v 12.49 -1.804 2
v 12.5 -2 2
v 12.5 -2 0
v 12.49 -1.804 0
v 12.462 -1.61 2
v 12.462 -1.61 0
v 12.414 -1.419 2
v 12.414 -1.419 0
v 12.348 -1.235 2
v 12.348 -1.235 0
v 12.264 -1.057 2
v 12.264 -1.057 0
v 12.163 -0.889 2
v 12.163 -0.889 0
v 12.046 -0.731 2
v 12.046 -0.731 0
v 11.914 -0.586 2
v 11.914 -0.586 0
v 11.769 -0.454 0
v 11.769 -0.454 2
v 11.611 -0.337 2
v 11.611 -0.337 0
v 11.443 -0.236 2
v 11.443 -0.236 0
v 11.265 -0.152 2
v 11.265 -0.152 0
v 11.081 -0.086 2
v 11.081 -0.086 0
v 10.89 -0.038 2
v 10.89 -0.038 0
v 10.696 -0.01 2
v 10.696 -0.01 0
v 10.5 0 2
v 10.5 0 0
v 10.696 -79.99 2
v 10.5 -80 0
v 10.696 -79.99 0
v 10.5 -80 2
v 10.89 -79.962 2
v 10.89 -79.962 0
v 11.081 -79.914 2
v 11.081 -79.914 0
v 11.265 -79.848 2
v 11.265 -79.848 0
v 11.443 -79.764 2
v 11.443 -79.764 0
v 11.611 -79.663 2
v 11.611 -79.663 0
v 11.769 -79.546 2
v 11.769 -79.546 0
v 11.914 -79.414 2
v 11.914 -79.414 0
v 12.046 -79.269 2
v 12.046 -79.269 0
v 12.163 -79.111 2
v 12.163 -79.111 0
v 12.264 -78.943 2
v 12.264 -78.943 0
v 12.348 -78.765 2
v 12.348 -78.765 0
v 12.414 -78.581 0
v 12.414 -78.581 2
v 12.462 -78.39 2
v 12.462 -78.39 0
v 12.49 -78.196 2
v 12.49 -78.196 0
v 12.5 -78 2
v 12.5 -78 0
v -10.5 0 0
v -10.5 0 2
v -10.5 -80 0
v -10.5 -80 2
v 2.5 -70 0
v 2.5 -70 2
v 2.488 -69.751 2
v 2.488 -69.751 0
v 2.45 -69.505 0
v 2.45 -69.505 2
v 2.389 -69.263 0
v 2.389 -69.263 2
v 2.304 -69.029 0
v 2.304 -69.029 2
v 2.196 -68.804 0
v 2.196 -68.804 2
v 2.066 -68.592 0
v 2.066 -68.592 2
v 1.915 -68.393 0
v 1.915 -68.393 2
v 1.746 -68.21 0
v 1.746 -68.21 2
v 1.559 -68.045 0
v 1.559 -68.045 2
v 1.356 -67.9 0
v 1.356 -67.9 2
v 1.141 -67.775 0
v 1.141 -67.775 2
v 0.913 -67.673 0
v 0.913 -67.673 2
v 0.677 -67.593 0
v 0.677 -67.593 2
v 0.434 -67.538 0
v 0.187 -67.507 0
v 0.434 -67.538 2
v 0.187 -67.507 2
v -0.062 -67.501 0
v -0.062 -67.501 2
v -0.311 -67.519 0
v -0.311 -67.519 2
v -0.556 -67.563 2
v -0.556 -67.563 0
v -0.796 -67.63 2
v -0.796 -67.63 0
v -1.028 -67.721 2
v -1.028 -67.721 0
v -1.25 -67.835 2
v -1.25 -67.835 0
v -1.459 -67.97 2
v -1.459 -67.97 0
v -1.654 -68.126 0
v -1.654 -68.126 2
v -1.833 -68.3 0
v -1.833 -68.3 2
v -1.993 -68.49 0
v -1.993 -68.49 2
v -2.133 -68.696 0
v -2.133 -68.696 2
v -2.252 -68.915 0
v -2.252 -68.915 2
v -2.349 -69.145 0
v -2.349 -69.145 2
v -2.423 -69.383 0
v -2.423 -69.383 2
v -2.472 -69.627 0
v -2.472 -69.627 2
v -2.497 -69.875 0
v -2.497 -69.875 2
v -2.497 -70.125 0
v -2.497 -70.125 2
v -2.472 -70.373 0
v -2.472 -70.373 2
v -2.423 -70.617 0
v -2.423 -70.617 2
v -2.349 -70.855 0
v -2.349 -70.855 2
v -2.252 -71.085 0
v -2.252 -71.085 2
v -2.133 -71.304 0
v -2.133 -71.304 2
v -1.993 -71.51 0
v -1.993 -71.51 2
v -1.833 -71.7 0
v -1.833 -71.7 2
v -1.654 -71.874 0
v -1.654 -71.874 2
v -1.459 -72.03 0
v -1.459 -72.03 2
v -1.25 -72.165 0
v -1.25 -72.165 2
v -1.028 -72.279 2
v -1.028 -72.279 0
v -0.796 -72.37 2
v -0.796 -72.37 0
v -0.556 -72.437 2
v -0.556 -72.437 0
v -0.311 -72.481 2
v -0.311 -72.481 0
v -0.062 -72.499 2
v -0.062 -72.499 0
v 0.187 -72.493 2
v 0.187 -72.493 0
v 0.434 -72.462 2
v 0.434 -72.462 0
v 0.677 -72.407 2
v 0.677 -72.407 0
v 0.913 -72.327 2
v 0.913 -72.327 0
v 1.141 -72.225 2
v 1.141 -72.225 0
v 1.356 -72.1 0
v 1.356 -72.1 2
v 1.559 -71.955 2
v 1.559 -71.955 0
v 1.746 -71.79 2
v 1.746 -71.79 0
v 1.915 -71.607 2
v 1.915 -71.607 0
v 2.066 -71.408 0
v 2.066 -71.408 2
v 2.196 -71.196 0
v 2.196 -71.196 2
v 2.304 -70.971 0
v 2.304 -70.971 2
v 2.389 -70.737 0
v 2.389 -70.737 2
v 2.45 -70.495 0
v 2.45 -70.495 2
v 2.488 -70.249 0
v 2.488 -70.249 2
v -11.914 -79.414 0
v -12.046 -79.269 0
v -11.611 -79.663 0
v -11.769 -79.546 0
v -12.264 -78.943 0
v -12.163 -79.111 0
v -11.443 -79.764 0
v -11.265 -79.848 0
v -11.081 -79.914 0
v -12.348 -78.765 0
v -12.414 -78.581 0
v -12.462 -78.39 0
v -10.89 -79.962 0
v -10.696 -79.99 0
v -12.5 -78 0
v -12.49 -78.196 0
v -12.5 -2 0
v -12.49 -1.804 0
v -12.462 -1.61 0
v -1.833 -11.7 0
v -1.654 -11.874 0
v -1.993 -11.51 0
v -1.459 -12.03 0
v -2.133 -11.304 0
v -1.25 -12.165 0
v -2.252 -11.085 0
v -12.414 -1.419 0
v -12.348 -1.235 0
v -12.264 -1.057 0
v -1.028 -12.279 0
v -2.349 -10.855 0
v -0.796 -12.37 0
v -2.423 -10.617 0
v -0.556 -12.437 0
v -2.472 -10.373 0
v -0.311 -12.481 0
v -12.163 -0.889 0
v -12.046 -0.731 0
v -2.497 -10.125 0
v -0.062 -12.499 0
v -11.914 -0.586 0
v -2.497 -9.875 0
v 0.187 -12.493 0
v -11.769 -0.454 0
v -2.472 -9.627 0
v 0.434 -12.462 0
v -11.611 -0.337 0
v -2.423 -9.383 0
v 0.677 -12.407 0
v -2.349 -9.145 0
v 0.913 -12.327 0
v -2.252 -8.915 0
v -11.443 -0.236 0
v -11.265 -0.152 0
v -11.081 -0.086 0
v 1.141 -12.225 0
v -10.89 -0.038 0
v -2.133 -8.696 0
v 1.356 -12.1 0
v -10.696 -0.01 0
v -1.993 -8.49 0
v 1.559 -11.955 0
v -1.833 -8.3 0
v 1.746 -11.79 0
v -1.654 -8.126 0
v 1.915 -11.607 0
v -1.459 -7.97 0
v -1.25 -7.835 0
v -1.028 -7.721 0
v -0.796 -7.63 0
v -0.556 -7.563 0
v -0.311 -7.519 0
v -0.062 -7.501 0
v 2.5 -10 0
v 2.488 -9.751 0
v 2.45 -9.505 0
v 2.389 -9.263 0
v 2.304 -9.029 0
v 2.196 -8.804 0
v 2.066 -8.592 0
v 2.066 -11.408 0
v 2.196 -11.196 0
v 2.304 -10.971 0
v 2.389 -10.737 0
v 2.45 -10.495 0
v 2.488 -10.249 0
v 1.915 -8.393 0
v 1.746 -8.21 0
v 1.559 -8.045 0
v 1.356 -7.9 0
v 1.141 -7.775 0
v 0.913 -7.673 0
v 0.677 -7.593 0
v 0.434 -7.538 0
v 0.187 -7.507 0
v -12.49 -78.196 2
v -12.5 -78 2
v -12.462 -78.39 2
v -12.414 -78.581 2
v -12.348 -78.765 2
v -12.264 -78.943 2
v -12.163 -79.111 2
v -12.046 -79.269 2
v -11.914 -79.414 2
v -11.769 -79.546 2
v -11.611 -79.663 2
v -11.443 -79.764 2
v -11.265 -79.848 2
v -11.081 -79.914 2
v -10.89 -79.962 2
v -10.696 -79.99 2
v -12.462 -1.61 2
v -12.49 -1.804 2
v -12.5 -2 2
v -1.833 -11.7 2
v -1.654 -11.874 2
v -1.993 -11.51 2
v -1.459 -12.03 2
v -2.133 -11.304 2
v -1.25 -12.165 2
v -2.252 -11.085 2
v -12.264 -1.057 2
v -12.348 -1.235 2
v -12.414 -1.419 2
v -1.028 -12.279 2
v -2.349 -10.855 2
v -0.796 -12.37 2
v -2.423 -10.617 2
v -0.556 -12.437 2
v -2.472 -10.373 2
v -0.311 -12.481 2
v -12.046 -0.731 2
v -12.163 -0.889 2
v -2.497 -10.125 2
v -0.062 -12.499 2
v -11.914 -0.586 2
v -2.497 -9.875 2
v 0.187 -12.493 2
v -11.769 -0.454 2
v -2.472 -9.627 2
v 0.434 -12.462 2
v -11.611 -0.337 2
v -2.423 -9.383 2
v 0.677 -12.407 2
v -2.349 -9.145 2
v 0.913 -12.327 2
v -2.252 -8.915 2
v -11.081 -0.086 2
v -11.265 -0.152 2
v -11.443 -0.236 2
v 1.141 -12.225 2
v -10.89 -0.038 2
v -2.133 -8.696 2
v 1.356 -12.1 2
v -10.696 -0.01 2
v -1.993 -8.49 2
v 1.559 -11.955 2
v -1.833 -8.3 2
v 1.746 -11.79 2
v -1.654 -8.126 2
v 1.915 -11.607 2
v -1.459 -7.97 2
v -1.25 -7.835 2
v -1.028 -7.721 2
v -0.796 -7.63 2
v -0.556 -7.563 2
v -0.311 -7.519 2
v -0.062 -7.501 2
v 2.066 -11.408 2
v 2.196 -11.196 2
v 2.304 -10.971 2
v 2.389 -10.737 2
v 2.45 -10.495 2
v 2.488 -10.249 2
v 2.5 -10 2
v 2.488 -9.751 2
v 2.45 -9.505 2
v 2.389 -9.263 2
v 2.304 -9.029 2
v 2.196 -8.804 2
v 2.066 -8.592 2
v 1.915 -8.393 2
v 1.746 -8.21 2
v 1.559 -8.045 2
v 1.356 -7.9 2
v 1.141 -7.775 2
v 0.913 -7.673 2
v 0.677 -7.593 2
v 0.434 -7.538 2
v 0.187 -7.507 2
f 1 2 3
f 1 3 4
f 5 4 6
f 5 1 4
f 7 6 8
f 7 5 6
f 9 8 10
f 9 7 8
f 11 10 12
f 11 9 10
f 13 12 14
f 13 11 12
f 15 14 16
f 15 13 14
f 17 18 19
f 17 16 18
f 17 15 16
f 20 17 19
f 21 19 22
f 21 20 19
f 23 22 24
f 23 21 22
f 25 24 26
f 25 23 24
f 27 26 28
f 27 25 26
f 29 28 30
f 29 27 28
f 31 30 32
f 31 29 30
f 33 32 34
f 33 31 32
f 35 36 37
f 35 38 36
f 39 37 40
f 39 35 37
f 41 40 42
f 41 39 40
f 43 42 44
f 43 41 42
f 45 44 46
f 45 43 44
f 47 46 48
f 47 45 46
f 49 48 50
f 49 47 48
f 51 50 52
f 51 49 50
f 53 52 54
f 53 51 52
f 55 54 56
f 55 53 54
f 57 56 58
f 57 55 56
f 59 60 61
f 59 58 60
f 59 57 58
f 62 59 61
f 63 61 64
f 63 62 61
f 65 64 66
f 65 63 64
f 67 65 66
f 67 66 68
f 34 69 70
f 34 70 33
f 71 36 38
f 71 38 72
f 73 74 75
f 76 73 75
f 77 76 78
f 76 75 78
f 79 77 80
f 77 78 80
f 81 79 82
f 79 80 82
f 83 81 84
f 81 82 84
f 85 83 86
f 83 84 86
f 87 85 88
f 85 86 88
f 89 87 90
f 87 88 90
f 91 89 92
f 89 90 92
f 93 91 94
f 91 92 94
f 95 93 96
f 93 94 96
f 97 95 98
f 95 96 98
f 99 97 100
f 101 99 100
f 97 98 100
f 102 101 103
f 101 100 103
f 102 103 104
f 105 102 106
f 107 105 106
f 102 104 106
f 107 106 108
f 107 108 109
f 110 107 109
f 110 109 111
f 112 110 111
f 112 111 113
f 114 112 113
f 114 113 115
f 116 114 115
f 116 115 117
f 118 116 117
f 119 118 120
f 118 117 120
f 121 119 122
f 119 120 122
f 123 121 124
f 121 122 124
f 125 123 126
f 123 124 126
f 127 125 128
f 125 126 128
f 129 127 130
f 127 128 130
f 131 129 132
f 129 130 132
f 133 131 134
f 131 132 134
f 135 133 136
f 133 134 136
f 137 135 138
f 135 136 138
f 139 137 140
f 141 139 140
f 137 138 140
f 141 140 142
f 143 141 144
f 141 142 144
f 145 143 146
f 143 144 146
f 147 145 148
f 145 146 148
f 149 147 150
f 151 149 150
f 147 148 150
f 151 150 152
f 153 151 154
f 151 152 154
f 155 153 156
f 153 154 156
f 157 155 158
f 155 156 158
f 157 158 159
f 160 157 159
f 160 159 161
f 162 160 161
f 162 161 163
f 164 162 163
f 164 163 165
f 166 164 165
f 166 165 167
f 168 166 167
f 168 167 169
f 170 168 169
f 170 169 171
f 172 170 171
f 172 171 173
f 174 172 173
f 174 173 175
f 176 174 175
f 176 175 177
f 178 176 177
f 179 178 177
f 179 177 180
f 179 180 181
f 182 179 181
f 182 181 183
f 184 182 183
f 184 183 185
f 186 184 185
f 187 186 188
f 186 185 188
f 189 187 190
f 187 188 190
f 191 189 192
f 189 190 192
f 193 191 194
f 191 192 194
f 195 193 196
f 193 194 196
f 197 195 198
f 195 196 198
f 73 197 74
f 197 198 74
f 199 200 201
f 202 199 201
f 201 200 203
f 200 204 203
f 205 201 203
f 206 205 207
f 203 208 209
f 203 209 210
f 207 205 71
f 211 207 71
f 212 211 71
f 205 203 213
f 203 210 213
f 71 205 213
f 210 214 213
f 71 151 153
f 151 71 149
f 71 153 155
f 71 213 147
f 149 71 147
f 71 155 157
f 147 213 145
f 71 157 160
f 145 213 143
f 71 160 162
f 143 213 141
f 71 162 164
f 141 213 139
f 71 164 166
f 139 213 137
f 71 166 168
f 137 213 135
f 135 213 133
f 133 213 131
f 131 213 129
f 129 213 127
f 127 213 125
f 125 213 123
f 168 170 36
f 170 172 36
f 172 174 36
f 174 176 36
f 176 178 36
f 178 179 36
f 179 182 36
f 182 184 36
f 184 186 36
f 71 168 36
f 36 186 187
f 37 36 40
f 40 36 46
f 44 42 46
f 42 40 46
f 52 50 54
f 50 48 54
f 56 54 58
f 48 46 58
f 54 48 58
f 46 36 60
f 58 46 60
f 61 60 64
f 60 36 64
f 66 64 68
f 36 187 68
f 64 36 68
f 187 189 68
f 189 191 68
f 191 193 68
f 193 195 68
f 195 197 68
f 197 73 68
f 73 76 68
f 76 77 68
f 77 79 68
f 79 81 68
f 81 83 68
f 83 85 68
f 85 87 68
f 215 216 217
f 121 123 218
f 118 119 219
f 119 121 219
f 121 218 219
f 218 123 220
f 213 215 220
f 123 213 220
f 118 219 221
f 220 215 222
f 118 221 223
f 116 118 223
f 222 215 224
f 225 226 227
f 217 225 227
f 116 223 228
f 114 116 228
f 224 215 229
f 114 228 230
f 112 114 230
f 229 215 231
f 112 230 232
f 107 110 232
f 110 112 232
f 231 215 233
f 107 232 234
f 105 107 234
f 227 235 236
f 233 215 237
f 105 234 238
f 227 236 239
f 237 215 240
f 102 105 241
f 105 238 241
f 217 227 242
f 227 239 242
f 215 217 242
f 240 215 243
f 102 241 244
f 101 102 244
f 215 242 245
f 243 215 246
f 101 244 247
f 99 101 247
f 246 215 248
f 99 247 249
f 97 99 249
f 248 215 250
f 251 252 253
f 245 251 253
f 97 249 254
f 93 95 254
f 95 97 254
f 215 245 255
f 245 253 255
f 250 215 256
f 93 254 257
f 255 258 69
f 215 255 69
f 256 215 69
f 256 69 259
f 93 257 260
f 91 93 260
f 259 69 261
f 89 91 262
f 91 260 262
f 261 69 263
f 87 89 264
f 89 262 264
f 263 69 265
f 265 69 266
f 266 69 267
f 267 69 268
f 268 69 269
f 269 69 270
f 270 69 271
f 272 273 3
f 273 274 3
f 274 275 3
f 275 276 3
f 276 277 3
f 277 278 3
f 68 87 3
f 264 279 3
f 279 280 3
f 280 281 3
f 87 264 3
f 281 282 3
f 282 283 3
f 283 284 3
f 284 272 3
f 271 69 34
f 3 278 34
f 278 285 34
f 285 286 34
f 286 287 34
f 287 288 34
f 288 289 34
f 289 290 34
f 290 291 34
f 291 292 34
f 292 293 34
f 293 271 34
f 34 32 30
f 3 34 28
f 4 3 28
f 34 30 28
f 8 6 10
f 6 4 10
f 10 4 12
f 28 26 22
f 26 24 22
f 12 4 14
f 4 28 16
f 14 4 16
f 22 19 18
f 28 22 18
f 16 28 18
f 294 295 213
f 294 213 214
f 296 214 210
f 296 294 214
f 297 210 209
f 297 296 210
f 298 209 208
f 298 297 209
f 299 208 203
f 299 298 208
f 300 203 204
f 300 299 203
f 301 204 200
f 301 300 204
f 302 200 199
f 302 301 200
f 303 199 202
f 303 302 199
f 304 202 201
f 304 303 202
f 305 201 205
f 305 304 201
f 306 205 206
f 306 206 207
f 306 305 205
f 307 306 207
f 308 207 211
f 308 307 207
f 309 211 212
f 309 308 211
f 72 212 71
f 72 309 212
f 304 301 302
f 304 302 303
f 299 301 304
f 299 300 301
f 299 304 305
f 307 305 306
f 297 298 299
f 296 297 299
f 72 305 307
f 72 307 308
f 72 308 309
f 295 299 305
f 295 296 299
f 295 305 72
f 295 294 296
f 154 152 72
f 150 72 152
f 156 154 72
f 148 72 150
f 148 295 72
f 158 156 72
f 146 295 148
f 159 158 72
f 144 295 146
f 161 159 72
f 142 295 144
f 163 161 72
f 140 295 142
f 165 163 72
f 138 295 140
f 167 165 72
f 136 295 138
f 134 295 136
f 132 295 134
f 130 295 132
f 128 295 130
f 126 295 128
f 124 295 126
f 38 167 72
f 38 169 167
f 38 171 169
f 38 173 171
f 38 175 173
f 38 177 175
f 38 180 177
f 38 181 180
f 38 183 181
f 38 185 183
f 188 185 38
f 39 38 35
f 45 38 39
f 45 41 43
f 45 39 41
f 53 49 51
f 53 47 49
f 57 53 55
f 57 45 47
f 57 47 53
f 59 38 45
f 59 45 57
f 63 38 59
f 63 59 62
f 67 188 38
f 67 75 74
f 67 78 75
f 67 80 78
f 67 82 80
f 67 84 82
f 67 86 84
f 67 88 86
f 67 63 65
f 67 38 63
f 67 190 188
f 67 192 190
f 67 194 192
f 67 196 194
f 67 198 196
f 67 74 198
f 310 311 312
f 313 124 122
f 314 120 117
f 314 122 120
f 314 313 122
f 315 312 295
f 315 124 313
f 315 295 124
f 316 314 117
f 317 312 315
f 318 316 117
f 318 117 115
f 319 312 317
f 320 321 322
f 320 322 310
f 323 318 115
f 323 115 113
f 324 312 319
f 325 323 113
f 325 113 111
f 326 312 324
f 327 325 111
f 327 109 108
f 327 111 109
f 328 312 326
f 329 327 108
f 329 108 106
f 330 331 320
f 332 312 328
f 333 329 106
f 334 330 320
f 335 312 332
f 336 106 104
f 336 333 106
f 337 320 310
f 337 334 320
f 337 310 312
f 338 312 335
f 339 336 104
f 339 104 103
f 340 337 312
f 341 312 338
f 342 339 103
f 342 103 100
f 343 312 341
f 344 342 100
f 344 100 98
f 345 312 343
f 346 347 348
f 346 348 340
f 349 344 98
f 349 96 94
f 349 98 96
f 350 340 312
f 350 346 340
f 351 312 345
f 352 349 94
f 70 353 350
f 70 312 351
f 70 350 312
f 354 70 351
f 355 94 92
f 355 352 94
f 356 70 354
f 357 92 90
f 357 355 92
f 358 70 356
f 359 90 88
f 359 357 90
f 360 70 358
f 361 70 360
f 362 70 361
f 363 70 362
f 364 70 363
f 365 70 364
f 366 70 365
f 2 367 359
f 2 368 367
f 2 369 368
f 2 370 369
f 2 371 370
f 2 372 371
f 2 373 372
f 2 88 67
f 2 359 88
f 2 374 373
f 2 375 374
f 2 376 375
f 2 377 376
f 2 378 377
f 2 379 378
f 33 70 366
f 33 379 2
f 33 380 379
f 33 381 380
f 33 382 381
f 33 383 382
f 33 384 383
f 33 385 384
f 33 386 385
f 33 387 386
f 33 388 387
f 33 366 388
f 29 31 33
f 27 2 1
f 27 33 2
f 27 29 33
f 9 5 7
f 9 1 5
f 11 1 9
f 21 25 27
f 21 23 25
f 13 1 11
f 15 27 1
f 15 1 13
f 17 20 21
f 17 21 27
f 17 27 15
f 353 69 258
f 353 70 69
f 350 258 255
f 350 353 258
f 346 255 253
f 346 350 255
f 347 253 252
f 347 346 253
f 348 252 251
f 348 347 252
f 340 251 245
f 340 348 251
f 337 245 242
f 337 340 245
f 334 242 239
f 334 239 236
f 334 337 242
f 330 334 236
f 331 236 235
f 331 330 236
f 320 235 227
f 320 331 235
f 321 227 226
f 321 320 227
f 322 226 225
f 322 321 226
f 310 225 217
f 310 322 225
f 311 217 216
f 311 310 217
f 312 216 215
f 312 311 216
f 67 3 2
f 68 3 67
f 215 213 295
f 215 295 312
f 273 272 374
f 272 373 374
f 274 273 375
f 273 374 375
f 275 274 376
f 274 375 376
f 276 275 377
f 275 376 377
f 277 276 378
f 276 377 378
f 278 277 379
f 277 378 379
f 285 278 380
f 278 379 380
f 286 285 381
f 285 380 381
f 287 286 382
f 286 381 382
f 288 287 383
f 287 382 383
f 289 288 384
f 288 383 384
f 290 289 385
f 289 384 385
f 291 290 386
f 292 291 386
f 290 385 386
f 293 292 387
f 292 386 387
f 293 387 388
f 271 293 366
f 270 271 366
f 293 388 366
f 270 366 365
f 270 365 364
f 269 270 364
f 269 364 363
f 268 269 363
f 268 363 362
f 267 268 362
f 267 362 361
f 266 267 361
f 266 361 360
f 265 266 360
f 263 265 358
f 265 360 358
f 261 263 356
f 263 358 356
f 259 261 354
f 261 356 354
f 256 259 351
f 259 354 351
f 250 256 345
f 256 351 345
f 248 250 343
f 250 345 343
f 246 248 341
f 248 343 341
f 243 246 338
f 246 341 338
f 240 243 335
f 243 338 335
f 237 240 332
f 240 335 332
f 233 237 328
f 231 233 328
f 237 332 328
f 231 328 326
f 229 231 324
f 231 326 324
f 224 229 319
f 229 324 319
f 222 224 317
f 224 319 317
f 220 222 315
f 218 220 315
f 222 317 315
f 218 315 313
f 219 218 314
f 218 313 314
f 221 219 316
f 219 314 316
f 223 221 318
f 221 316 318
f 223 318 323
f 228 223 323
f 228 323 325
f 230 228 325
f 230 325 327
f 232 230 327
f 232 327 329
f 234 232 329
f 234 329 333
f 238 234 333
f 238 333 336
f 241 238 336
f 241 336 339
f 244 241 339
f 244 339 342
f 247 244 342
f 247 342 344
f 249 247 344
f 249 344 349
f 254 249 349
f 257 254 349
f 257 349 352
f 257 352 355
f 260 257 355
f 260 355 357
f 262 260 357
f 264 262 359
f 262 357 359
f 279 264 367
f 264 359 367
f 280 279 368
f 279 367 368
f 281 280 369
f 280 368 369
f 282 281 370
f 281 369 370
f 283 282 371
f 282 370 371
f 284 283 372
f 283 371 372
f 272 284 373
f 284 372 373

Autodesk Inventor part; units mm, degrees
ref_plane "YZ Plane" through (0, 0, 0) normal (1, 0, 0) x (0, 1, 0)
ref_plane "XZ Plane" through (0, 0, 0) normal (0, 1, 0) x (-1, 0, 0)
ref_plane "XY Plane" through (0, 0, 0) normal (0, 0, 1) x (1, 0, 0)
sketch "Sketch1" plane through (0, 0, 0) normal (0, 0, 1) x (1, 0, 0)
  line L0 (-12.5, 0) -> (12.5, 0)
  line L1 (12.5, 0) -> (12.5, -80)
  line L2 (12.5, -80) -> (-12.5, -80)
  line L3 (-12.5, -80) -> (-12.5, 0)
  point P0 (0, 0)
  point P1 (0, 0)
  dimension "d0" = 25
  dimension "d1" = 80
extrude "Plate1" add sketch "Sketch1" along normal blind 2
sketch "Sketch8" plane through (0, 0, 2) normal (0, 0, 1) x (1, 0, 0)
  line L0 (-12.5, -80) -> (-12.5, 0) construction
  line L1 (12.5, -80) -> (-12.5, -80) projected
  line L2 (12.5, 0) -> (12.5, -80) projected
  line L3 (-12.5, 0) -> (12.5, 0) projected
  circle A0 centre (0, -70) radius 2.5
  circle A1 centre (0, -10) radius 2.5
  line L4 (-12.5, 0) -> (-12.5, -80) construction
  line L5 (-12.5, -40) -> (12.5, -40) construction
  point P0 (0, 0)
  dimension "d34" = 5
  dimension "d35" = 10
extrude "Extrusion3" cut sketch "Sketch8" against normal through all
fillet "Fillet2" radius 2 4 edges at (-12.5, -80, 1) (12.5, -80, 1) (12.5, 0, 1) (-12.5, 0, 1)
equation "\"d2\" = Thickness"
equation "\"BendReliefWidth\" = Thickness"
equation "\"BendReliefDepth\" = 0.5 * Thickness"
equation "\"CornerReliefSize\" = 4 * Thickness"
equation "\"MinimumRemnant\" = 2 * Thickness"
equation "\"TransitionRadius\" = BendRadius"
equation "\"JacobiRadiusSize\" = BendRadius"
equation "\"GapSize\" = Thickness"
equation "\"Thickness\" = 2"
equation "\"BendRadius\" = 2.75"
properties part number "NDM 11.025 bracket 25" material "Stainless Steel"
